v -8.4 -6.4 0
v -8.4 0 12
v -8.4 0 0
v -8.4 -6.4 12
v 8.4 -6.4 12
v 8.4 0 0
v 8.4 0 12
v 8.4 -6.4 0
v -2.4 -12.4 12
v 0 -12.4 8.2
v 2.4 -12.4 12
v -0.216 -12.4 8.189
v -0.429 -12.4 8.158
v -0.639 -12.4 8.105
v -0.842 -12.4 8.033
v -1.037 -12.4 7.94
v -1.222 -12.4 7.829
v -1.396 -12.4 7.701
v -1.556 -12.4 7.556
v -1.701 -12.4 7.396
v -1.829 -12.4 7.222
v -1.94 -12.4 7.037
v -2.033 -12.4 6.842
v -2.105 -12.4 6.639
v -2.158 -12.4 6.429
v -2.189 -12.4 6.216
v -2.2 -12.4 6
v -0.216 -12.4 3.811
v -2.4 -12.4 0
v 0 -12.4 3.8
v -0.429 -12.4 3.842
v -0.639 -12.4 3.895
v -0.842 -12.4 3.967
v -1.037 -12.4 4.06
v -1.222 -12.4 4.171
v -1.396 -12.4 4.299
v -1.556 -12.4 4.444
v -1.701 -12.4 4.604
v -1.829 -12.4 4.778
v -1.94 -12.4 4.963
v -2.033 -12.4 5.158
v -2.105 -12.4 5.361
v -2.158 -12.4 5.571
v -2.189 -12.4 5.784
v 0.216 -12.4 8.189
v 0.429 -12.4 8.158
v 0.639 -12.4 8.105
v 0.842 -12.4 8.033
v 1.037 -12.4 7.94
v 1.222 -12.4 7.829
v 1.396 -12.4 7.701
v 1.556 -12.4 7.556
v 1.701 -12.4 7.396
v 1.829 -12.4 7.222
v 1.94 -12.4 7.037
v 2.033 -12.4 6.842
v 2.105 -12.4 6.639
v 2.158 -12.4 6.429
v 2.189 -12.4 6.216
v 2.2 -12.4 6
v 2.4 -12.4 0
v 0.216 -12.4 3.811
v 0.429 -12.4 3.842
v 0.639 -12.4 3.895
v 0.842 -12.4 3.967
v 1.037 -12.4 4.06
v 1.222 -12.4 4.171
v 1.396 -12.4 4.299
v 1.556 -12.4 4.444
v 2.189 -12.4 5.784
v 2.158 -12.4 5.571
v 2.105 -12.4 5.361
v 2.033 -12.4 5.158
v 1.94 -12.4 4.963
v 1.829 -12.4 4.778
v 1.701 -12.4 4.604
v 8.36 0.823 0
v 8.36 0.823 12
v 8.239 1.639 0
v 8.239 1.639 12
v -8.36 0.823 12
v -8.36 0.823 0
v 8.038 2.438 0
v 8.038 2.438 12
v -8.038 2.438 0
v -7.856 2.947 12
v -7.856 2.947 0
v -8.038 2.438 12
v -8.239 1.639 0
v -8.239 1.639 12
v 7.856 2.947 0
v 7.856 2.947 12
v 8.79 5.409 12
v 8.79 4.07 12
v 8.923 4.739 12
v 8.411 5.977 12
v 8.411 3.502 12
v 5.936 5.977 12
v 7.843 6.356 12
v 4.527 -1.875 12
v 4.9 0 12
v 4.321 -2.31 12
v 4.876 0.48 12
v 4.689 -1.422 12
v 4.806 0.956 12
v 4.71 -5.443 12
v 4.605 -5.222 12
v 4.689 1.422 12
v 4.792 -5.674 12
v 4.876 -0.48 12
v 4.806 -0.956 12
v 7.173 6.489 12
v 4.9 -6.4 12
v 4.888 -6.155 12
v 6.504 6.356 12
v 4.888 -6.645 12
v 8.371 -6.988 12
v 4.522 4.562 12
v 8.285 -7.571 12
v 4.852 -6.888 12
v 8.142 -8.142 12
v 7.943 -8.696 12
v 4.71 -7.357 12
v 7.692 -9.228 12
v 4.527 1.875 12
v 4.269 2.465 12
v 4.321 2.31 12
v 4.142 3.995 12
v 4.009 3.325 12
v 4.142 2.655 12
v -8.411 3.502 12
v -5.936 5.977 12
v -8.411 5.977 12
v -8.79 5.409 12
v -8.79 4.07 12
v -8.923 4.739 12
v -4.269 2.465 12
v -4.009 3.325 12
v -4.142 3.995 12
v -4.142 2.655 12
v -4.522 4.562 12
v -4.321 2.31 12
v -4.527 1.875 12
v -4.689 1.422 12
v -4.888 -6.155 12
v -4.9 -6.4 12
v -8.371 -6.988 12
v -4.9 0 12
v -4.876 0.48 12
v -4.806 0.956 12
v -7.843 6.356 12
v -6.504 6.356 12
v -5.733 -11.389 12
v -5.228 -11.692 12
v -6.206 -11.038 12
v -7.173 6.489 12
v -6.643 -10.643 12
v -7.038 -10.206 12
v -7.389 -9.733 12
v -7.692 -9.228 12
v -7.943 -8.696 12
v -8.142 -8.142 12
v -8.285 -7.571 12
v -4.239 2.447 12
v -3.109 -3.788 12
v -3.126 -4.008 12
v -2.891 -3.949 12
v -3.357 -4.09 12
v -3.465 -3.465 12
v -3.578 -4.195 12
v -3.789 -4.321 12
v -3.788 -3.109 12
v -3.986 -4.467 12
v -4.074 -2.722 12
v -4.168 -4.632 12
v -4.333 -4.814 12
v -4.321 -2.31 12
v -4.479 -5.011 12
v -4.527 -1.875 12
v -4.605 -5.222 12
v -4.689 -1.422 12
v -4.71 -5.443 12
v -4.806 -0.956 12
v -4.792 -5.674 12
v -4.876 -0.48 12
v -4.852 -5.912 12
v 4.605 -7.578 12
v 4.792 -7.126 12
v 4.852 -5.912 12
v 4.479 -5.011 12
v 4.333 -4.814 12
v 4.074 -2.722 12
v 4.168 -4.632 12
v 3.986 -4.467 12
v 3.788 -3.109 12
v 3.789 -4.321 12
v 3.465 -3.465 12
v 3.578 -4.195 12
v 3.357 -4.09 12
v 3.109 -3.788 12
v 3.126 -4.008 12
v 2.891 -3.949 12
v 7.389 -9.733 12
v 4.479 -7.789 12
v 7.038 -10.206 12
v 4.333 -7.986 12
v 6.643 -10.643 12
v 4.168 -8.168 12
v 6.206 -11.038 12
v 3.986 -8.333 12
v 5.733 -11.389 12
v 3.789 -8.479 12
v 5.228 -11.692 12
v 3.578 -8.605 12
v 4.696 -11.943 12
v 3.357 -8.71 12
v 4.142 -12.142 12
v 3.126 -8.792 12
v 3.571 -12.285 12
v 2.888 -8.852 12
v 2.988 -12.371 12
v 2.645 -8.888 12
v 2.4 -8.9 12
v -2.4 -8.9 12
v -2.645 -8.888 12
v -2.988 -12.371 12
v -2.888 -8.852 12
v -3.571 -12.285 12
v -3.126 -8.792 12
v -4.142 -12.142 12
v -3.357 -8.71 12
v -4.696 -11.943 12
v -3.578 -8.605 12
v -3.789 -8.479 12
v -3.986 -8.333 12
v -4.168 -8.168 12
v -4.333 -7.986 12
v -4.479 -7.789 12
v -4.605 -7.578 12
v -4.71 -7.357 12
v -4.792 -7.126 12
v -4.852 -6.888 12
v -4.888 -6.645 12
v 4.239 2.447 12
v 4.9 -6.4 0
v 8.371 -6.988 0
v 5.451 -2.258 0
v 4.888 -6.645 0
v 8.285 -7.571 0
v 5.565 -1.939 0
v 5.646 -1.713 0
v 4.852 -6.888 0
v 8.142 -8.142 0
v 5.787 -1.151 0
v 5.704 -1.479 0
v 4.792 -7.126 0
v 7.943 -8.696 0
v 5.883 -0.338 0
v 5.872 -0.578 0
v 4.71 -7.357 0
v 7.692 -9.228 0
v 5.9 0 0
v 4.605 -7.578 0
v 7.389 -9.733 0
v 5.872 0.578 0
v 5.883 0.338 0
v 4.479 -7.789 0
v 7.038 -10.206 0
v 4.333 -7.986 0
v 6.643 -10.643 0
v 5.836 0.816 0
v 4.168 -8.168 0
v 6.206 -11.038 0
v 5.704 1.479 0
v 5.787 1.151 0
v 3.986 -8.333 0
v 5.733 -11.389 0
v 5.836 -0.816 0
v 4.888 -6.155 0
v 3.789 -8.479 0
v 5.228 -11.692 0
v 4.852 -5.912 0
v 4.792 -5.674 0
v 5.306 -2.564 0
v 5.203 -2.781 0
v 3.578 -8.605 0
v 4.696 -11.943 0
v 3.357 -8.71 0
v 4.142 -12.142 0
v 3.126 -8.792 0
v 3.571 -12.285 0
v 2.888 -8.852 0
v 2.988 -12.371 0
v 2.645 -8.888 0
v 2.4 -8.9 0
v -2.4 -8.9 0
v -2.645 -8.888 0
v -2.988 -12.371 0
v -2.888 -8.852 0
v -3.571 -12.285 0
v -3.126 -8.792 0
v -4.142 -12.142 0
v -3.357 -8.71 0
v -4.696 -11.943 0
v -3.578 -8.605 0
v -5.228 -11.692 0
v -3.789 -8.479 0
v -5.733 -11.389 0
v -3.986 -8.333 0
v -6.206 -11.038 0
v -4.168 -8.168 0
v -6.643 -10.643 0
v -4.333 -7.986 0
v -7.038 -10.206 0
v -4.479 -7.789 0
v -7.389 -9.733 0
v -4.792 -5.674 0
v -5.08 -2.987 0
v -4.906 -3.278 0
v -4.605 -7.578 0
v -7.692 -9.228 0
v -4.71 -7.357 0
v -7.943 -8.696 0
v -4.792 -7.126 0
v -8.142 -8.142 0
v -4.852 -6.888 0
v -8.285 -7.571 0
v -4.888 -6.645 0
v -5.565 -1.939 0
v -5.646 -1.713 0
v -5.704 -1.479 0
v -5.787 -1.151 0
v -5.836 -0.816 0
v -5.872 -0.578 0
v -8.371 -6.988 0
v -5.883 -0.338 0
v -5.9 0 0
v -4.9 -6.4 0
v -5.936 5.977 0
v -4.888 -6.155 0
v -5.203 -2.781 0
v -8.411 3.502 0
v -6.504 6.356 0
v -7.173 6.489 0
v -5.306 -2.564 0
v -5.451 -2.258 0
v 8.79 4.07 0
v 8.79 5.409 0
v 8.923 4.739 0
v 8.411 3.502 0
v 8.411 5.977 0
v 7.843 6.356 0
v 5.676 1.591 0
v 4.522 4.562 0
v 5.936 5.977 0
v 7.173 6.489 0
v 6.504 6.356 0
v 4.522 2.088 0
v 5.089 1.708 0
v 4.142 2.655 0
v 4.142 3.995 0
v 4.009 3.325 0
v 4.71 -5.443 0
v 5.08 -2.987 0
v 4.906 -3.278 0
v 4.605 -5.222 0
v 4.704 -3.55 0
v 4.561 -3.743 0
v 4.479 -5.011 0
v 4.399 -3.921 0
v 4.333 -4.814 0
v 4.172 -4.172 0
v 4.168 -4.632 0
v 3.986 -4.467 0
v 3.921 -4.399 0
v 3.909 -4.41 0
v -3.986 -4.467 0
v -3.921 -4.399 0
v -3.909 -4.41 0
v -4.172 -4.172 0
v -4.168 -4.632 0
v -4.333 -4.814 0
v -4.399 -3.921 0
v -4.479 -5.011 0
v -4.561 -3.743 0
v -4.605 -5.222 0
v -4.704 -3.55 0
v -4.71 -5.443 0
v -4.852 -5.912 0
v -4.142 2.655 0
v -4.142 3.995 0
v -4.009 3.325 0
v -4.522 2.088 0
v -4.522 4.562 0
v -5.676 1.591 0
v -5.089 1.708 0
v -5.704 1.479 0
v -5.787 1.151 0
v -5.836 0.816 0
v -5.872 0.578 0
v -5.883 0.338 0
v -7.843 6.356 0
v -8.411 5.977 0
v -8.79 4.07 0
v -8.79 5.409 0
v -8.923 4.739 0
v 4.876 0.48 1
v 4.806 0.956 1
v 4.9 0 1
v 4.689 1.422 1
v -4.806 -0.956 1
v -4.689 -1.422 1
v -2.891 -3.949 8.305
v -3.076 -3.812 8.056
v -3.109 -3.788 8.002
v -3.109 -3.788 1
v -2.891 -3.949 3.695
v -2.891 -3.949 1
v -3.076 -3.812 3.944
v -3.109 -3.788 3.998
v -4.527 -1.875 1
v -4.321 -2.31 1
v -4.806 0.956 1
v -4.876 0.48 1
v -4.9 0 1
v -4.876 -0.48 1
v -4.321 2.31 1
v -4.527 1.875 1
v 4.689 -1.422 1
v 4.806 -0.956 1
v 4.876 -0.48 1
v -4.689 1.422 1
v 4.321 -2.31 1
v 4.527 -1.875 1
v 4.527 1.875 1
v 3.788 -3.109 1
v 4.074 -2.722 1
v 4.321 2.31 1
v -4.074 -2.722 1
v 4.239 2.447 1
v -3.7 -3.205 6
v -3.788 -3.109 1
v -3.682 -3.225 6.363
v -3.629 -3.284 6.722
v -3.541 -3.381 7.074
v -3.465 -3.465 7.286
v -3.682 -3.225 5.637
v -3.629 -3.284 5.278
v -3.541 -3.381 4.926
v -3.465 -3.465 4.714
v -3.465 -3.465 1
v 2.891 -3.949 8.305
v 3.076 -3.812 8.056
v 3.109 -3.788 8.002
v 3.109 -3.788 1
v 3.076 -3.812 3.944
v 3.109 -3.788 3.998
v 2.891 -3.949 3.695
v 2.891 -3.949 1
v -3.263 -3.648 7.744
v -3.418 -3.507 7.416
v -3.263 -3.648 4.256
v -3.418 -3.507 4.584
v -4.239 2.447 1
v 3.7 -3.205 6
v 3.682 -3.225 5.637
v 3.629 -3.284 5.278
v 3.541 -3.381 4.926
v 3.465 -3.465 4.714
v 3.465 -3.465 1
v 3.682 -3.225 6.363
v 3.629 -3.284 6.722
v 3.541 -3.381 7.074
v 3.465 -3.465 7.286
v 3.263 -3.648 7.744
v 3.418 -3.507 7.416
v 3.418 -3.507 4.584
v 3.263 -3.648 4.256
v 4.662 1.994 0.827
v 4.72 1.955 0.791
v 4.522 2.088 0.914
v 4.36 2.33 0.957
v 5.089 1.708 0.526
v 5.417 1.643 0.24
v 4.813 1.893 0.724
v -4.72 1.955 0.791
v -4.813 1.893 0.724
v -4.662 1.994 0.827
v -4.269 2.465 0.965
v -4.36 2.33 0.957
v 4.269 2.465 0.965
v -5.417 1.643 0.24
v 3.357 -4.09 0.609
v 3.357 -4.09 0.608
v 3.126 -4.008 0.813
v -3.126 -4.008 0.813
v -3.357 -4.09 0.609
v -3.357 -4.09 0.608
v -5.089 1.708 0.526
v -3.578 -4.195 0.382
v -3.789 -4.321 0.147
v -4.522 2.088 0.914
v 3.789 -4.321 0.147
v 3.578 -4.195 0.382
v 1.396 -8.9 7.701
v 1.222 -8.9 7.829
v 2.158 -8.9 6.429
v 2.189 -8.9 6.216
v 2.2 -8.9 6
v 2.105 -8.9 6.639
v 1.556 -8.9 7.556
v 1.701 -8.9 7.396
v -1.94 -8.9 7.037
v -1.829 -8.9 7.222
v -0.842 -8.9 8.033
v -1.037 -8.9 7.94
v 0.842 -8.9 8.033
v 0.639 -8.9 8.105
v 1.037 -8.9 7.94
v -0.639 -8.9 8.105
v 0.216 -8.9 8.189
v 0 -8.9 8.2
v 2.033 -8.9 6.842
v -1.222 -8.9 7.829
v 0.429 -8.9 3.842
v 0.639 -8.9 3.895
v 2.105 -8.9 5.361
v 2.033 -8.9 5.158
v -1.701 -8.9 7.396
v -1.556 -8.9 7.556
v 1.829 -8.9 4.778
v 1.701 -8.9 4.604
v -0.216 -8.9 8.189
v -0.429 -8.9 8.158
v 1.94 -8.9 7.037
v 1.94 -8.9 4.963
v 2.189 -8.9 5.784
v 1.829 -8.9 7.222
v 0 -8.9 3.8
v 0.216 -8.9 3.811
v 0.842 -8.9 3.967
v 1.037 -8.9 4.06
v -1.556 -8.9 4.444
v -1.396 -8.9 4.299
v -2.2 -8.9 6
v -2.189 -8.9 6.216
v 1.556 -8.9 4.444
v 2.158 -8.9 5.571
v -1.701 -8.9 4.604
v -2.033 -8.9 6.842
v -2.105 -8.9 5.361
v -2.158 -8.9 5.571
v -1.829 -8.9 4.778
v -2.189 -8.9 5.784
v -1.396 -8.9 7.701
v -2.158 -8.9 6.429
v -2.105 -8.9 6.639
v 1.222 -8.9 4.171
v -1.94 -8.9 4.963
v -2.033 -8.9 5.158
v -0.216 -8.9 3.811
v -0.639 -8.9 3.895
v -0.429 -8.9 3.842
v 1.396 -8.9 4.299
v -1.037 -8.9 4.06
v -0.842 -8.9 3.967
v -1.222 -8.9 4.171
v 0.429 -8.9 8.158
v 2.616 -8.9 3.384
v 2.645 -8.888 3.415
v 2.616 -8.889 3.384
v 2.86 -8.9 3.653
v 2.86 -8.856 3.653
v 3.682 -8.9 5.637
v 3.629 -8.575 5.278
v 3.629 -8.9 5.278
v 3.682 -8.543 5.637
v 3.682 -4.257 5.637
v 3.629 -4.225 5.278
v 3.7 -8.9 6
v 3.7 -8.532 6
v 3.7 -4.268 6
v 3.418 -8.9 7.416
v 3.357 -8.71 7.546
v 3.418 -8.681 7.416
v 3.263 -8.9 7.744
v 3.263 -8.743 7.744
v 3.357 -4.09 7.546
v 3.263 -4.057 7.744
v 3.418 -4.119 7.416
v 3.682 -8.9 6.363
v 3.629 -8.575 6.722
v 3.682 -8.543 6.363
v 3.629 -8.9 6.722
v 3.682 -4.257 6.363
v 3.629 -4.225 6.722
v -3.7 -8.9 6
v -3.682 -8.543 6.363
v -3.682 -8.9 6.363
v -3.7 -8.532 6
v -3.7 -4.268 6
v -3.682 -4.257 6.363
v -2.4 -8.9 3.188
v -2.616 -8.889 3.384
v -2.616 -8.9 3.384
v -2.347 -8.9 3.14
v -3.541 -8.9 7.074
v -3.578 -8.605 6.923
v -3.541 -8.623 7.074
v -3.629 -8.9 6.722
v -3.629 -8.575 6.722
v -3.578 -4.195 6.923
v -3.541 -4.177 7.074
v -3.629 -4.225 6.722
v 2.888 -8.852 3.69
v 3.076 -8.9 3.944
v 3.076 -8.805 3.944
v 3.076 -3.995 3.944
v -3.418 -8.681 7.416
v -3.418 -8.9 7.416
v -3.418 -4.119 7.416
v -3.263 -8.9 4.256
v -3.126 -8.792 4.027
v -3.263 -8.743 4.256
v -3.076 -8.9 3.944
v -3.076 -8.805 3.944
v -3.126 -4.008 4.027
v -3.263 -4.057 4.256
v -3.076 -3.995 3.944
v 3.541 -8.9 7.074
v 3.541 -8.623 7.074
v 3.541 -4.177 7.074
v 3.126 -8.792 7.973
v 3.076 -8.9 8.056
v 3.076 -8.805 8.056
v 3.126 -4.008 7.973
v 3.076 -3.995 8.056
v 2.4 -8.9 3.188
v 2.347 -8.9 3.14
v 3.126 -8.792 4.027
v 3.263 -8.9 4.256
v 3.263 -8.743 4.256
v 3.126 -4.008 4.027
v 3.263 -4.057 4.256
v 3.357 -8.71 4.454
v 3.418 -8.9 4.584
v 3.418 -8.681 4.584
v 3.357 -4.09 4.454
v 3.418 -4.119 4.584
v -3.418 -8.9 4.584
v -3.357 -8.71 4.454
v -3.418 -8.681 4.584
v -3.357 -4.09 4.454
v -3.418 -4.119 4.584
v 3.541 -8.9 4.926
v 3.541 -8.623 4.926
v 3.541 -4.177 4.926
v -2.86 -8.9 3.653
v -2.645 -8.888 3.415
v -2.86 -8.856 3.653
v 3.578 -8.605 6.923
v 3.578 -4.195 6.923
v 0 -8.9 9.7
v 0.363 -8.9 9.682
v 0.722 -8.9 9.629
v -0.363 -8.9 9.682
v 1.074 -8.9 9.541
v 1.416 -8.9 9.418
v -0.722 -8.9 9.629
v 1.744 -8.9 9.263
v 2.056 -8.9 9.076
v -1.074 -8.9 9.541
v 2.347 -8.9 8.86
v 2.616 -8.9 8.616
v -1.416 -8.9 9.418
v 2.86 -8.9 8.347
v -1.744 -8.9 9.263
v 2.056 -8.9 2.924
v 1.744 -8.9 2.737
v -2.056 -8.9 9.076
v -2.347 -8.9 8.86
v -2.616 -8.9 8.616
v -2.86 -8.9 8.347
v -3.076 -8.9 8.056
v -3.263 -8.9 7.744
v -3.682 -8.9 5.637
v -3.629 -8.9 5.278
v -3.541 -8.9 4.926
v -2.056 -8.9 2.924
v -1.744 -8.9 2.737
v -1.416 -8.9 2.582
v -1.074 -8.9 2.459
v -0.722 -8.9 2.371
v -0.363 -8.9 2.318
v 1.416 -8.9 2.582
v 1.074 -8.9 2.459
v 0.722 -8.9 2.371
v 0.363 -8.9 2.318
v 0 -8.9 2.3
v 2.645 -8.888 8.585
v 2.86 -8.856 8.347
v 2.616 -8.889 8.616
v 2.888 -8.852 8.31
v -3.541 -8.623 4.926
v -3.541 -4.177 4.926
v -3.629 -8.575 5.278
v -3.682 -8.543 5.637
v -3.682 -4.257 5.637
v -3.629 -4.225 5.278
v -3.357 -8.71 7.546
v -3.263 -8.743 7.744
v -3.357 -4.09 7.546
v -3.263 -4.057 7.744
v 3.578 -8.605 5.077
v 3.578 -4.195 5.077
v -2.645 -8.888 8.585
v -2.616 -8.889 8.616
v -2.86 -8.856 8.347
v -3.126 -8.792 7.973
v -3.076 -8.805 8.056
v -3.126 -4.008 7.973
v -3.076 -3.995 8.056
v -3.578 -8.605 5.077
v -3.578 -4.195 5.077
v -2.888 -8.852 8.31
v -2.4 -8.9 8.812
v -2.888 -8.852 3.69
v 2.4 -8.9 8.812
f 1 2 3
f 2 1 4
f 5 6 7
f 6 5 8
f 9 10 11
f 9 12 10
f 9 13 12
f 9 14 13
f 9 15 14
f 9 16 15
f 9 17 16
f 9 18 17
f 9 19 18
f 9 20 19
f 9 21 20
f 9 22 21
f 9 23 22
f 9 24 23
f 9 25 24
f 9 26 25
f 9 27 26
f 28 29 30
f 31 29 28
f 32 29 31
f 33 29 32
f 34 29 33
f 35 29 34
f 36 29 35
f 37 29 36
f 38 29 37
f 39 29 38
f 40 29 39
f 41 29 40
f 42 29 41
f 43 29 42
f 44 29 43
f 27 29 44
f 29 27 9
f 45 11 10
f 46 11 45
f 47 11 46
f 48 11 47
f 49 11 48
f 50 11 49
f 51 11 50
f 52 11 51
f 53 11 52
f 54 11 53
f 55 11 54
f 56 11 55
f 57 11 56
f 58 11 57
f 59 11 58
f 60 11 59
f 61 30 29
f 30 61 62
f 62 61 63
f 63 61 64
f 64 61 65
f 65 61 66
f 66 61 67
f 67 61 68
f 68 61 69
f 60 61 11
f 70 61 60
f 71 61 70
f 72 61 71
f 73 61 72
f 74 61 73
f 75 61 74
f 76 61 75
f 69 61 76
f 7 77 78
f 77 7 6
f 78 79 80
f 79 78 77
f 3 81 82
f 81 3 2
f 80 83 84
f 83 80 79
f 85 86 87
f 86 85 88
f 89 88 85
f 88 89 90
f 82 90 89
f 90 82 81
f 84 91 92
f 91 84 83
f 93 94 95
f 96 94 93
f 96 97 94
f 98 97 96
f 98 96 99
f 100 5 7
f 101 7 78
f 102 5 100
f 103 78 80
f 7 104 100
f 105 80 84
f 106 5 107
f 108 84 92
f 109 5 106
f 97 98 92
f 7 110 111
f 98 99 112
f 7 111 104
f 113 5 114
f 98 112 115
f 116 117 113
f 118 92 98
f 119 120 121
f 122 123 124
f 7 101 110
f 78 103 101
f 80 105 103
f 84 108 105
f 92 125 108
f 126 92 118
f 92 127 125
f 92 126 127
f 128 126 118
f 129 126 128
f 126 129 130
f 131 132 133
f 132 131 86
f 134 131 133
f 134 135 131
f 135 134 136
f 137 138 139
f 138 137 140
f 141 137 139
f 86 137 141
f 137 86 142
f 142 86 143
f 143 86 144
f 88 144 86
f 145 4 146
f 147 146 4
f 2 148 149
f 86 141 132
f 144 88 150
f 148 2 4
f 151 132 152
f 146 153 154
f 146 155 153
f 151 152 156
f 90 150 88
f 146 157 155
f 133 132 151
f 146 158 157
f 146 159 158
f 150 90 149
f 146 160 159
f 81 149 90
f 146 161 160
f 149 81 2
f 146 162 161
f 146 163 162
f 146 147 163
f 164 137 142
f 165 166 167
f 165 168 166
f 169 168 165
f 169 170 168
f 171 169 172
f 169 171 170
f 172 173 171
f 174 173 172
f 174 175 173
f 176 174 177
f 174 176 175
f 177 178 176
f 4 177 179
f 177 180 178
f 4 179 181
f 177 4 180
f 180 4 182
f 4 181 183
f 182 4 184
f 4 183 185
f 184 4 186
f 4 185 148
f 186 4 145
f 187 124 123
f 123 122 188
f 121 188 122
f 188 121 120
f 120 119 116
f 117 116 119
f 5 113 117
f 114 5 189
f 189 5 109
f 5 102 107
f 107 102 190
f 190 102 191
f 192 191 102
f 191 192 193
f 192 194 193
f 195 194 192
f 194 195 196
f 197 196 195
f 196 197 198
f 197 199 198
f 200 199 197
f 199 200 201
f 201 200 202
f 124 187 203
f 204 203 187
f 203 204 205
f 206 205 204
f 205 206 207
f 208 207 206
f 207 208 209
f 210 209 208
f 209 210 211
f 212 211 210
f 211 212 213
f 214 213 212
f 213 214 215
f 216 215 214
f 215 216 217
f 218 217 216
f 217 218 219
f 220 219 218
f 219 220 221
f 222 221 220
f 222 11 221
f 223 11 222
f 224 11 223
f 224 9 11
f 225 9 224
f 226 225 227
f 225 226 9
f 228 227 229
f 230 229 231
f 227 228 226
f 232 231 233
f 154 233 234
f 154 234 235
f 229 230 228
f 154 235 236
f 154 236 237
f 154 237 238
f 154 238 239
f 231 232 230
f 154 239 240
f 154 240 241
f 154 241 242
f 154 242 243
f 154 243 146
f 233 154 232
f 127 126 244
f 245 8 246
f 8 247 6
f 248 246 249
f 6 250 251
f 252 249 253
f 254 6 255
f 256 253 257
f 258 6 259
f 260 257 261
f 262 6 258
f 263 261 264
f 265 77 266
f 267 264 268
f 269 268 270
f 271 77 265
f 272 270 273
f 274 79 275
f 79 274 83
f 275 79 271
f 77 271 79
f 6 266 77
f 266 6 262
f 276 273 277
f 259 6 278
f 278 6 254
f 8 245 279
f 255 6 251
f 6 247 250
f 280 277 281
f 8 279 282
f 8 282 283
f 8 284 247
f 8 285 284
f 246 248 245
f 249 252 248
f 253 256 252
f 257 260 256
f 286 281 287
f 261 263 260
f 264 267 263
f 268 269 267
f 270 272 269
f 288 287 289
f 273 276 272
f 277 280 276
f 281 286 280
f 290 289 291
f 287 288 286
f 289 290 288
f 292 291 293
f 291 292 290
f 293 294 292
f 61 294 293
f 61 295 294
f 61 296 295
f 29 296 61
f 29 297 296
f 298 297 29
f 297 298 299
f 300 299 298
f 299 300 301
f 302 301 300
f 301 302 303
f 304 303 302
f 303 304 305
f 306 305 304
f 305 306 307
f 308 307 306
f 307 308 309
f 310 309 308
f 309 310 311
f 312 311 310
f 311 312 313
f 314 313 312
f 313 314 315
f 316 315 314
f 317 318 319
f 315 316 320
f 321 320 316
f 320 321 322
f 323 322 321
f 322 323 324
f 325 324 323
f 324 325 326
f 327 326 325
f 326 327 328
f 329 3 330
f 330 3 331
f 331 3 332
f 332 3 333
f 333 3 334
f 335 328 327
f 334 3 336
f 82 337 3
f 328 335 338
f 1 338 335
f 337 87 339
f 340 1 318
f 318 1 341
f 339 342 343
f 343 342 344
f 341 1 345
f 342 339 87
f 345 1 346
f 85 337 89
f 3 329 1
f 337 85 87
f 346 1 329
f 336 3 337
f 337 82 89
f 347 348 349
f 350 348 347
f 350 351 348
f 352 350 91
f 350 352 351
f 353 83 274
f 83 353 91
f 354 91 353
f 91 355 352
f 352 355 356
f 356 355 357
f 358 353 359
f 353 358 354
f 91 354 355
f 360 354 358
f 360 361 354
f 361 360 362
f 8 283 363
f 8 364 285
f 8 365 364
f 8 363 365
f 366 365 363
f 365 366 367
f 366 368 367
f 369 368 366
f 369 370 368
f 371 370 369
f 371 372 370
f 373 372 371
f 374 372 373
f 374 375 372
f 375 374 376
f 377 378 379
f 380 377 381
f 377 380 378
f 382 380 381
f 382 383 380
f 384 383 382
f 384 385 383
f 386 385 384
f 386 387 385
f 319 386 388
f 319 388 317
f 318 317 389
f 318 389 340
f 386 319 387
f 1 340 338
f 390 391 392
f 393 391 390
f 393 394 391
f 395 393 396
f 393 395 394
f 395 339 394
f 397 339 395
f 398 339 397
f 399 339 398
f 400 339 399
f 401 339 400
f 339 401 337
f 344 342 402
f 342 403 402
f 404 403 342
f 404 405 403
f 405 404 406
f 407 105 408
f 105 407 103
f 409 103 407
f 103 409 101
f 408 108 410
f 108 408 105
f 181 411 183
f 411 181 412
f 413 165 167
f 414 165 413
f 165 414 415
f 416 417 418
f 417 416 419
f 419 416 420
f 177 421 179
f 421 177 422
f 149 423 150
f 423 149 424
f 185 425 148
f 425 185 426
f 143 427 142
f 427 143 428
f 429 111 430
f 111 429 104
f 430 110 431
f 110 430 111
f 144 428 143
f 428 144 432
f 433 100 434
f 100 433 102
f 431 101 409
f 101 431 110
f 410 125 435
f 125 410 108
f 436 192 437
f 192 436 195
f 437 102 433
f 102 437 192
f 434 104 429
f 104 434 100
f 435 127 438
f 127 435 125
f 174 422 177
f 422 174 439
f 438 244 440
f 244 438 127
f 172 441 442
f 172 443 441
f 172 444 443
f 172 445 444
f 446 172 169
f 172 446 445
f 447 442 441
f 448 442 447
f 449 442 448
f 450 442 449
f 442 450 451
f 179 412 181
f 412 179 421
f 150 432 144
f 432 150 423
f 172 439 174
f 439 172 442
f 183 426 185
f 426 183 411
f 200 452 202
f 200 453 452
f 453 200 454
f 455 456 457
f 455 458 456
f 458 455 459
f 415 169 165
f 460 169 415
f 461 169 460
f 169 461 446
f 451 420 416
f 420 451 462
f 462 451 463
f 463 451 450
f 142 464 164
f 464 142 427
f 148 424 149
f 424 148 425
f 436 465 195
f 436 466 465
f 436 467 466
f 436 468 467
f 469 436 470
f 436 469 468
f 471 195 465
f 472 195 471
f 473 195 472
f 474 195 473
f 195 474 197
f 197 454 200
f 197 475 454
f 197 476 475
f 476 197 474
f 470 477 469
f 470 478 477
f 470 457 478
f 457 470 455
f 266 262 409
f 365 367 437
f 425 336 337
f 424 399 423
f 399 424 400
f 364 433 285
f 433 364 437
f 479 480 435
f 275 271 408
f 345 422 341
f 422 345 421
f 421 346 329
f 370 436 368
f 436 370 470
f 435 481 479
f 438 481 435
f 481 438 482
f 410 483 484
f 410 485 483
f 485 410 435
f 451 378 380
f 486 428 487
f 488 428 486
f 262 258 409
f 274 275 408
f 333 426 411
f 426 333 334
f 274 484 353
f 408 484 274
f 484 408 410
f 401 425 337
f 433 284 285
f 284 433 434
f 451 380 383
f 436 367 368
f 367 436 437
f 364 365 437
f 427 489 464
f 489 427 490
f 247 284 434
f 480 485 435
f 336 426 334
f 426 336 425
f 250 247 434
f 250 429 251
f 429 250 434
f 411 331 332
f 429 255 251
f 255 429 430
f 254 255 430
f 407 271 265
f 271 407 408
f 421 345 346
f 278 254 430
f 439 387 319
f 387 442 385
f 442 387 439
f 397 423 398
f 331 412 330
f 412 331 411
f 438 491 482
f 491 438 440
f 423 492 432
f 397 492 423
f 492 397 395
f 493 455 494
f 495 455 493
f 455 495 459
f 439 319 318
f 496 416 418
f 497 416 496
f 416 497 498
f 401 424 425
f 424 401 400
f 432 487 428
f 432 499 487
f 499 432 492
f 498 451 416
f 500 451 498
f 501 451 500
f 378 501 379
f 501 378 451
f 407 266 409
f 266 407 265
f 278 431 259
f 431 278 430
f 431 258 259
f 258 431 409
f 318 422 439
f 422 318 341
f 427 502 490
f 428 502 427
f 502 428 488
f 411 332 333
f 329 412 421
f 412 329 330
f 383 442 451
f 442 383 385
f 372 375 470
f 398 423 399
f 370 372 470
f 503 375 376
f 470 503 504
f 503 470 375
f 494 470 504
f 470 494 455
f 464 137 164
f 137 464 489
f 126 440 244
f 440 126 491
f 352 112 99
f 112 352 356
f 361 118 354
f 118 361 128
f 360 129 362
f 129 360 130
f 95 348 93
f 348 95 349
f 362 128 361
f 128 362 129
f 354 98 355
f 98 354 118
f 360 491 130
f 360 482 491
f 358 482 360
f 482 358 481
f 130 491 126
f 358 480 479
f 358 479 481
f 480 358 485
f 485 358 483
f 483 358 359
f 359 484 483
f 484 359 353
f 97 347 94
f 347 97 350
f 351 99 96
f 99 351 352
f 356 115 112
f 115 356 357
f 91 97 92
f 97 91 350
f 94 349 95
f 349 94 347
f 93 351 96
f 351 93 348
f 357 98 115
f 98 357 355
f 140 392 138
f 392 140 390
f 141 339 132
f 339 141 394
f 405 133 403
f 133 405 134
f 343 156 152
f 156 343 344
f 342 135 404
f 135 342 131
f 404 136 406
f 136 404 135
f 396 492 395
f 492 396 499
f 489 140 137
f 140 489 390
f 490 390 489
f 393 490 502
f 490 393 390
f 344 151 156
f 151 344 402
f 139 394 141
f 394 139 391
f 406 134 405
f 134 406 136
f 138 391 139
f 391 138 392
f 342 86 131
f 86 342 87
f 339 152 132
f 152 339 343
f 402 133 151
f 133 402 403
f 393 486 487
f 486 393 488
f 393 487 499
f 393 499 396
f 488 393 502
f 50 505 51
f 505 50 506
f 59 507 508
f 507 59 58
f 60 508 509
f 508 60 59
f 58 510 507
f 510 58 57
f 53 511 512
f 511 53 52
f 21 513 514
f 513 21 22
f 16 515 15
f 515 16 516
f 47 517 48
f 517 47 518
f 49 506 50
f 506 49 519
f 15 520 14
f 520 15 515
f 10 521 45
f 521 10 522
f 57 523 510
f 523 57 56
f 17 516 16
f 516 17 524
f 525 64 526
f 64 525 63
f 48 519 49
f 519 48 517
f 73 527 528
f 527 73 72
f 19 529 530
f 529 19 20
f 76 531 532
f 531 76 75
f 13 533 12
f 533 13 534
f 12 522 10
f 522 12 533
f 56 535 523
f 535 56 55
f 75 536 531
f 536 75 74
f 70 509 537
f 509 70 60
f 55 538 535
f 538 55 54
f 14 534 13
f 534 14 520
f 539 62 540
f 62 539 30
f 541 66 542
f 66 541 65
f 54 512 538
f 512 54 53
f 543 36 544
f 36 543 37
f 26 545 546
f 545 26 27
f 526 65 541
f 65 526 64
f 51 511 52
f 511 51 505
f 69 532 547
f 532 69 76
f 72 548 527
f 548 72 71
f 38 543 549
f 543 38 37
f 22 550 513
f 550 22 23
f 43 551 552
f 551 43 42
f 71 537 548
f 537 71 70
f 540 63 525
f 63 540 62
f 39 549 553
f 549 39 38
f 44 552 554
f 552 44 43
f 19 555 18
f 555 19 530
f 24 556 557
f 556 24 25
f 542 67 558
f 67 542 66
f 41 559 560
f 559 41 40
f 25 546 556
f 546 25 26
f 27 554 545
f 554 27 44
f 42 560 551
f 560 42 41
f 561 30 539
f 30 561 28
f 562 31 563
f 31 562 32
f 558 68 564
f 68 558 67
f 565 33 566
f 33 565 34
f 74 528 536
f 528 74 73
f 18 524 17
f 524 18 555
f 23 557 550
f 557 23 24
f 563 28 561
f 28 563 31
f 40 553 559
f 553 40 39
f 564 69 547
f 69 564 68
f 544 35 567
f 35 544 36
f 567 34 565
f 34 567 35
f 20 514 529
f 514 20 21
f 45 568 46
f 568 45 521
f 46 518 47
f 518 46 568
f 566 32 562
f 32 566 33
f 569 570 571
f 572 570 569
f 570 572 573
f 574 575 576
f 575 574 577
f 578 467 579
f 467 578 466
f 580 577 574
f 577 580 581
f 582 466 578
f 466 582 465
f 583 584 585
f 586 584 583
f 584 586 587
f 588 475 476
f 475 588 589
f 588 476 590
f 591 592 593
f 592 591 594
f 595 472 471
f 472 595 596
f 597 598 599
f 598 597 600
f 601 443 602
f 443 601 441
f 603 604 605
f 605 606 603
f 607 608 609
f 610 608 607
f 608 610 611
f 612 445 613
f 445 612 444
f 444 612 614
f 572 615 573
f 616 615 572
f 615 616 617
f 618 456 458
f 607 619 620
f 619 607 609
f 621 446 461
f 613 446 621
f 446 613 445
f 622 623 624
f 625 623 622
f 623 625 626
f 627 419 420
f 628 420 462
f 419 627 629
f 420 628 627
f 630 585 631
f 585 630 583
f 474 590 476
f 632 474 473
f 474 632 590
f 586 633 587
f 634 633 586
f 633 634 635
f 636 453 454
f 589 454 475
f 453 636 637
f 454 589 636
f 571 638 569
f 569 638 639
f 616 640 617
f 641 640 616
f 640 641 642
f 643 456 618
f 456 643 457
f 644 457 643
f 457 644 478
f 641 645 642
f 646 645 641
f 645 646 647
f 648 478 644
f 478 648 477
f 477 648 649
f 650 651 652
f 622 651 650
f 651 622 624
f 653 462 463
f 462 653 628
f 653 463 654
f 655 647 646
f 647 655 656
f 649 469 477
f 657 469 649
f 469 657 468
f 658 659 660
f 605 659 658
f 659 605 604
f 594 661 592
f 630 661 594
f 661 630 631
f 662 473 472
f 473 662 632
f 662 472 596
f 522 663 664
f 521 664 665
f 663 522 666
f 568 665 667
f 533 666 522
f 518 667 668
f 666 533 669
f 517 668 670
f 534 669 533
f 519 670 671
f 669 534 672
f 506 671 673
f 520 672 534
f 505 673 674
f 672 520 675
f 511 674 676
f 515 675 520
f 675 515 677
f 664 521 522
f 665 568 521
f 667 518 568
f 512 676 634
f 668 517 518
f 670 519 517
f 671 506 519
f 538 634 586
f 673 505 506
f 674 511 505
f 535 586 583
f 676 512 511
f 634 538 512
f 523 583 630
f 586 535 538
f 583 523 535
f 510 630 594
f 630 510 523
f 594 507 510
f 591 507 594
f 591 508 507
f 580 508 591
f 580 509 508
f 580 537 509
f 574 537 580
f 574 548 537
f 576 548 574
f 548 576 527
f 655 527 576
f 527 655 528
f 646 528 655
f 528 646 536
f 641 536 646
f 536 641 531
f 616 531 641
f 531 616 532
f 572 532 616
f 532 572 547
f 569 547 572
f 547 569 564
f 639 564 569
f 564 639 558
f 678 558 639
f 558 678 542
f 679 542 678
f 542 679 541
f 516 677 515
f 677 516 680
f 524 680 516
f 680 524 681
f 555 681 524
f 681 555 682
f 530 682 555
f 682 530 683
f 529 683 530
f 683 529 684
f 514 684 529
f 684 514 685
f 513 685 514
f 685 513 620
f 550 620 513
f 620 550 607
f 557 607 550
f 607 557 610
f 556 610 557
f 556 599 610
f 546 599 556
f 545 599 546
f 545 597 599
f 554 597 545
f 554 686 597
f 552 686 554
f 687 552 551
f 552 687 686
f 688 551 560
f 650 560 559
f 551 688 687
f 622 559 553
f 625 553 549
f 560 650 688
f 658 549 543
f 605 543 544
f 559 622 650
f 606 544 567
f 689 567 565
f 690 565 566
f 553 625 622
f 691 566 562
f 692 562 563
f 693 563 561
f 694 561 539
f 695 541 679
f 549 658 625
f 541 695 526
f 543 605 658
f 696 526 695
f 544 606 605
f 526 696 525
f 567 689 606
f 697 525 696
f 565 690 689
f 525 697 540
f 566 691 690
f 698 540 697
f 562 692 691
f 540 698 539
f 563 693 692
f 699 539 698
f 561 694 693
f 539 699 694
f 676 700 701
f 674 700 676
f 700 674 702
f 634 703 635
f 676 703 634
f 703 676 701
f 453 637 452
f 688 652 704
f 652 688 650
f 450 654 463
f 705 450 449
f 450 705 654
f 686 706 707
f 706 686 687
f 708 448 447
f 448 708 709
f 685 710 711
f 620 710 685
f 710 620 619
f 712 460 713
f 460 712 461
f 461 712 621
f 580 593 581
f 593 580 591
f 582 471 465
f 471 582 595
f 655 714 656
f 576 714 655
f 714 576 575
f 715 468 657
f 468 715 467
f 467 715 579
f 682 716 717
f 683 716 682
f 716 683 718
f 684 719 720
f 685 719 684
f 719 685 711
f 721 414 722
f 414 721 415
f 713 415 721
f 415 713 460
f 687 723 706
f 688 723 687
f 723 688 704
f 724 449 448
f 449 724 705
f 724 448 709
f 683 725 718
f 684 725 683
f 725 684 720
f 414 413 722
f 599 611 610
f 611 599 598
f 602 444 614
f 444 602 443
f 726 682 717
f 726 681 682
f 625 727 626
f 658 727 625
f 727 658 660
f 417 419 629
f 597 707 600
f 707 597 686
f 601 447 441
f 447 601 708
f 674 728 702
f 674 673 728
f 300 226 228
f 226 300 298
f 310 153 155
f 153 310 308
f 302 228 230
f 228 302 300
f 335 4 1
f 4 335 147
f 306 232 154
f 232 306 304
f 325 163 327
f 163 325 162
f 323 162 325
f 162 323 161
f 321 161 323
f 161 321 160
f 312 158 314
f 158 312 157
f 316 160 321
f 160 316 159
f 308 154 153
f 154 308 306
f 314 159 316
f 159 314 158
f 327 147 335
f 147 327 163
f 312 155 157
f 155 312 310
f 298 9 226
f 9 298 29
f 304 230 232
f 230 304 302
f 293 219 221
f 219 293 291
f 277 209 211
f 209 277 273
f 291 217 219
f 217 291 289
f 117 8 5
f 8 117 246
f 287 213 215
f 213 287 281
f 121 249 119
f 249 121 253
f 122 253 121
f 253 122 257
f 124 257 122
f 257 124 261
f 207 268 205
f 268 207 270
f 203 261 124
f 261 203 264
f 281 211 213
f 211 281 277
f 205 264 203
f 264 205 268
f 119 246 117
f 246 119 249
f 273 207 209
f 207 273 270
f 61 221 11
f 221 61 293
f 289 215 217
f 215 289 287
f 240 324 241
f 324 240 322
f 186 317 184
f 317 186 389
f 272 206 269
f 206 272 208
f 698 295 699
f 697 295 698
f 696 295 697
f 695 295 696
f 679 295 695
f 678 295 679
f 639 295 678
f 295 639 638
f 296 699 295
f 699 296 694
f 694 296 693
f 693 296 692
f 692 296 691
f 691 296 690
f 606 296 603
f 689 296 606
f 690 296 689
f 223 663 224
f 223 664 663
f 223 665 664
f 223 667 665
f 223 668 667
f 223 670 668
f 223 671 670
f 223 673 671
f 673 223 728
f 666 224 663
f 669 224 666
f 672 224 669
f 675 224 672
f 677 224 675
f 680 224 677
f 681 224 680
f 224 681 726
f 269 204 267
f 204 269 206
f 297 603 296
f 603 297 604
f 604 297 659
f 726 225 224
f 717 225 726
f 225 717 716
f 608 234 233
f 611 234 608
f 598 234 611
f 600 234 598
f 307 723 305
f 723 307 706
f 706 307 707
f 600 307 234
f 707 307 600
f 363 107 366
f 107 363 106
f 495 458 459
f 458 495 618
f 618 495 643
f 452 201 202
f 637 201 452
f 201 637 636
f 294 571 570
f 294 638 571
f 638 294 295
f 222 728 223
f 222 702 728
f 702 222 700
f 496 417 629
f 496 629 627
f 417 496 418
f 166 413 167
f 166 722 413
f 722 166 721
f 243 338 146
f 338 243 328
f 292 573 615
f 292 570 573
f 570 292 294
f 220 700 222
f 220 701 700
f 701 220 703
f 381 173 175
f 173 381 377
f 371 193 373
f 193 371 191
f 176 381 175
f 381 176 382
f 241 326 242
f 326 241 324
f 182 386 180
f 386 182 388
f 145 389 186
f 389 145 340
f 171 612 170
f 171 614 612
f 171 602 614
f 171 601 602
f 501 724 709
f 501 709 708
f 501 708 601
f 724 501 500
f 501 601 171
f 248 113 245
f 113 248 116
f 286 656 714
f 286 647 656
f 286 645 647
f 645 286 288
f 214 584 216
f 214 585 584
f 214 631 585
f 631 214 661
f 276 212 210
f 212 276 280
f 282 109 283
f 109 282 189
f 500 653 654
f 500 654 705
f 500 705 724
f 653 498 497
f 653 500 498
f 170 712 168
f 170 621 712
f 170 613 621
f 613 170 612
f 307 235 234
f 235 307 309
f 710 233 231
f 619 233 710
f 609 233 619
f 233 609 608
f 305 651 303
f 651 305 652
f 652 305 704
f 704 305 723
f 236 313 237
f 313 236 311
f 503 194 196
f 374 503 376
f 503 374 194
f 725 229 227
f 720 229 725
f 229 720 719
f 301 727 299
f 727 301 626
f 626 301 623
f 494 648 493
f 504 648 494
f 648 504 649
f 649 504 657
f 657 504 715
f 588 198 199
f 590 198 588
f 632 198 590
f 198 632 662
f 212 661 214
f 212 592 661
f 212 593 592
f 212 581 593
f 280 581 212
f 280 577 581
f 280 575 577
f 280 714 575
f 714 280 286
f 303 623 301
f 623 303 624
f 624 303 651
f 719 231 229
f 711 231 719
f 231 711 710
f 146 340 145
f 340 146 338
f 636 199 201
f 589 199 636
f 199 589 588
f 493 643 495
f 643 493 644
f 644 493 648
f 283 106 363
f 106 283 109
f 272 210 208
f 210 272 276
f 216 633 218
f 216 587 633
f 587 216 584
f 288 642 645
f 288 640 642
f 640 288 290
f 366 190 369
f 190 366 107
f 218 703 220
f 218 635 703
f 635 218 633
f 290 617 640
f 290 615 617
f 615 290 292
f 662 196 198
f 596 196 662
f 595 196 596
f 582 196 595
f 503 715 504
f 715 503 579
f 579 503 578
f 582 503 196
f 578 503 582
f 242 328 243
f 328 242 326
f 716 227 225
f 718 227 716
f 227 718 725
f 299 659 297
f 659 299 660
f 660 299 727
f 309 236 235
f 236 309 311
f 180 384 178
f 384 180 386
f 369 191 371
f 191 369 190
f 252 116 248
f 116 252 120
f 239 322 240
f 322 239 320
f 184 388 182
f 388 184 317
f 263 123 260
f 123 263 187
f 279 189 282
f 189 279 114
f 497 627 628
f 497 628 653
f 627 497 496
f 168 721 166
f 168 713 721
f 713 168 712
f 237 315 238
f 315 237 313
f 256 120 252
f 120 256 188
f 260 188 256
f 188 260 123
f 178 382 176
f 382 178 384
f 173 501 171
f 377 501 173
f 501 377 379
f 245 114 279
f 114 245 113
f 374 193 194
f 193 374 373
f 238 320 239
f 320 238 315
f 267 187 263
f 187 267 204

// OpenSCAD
// file: cylinder_clip.scad
use <../utilities.scad>;

module cylinder_clip(r=1,t=3,opening_angle=120,wing_length=2,wing_angle=45,flat_w=10,flat_t=3,h=10,$fn=$fn){
	union(){
		difference(){
			hull(){
				cylinder(r=r+t,$fn=$fn,h=h);
				translate([-flat_w/2,-r-flat_t,0]) cube([flat_w,0.1,h]);
			}
			cylinder(r=r,$fn=$fn,h=99999,center=true);
			cylinder(r1=r+2,r2=r,$fn=$fn,h=2,center=true);
			scale([tan(opening_angle/2),1,1]) rotate([0,0,45]) translate([0,0,-1]) cube([1,1,1]*9999);
		}
		reflect([1,0,0]) translate([sin(opening_angle/2),cos(opening_angle/2),0]*(r+t/2)) hull() repeat([sin(wing_angle),cos(wing_angle),0]*wing_length,2)
			cylinder(r=t/2,h=h,$fn=16);
			
	}
}

//cylinder_clip(r=3,t=2,flat_w=6);
union(){
	cylinder_clip(r=21,t=4.5,flat_t=10,opening_angle=100,$fn=64);
	translate([-5,-22-5-20,0]) cube([10,20,10]);
}
// main file
use <../utilities.scad>;
use <./cylinder_clip.scad>;

$fn=64;
rack_r = 10/2-0.1;
t=3.5;
h=12;
standoff = 4+t;
cr = 2.5;

difference(){
	cylinder_clip(r=rack_r,t=t,flat_t=standoff,flat_w=2*rack_r+2*t,h=h);
	translate([0,-rack_r-standoff+t,h/2]){
		//screw_y(4,fudge=0.9,h=999,shaft=true,extraheight=0);
		rotate([90,0,0]) cylinder(r=2.2,h=999,center=true);
		rotate([-90,0,0]) cylinder(r=3.7,h=999);
	}
	reflect([1,0,0]) translate([-rack_r+cr,-rack_r-standoff+t+cr,-1]) difference(){
		mirror([1,0,0]) mirror([0,1,0]) cube([999,999,999]);
		cylinder(r=t+cr,h=999,center=true);
	}
	hull() reflect([1,0,0]) translate([-rack_r+cr,-rack_r-standoff+t+cr,0]) cylinder(r=cr,h=999,center=true);
    translate([-2.5,-rack_r-standoff+2*t,-1]) cube([5,9999,9999]);
}
